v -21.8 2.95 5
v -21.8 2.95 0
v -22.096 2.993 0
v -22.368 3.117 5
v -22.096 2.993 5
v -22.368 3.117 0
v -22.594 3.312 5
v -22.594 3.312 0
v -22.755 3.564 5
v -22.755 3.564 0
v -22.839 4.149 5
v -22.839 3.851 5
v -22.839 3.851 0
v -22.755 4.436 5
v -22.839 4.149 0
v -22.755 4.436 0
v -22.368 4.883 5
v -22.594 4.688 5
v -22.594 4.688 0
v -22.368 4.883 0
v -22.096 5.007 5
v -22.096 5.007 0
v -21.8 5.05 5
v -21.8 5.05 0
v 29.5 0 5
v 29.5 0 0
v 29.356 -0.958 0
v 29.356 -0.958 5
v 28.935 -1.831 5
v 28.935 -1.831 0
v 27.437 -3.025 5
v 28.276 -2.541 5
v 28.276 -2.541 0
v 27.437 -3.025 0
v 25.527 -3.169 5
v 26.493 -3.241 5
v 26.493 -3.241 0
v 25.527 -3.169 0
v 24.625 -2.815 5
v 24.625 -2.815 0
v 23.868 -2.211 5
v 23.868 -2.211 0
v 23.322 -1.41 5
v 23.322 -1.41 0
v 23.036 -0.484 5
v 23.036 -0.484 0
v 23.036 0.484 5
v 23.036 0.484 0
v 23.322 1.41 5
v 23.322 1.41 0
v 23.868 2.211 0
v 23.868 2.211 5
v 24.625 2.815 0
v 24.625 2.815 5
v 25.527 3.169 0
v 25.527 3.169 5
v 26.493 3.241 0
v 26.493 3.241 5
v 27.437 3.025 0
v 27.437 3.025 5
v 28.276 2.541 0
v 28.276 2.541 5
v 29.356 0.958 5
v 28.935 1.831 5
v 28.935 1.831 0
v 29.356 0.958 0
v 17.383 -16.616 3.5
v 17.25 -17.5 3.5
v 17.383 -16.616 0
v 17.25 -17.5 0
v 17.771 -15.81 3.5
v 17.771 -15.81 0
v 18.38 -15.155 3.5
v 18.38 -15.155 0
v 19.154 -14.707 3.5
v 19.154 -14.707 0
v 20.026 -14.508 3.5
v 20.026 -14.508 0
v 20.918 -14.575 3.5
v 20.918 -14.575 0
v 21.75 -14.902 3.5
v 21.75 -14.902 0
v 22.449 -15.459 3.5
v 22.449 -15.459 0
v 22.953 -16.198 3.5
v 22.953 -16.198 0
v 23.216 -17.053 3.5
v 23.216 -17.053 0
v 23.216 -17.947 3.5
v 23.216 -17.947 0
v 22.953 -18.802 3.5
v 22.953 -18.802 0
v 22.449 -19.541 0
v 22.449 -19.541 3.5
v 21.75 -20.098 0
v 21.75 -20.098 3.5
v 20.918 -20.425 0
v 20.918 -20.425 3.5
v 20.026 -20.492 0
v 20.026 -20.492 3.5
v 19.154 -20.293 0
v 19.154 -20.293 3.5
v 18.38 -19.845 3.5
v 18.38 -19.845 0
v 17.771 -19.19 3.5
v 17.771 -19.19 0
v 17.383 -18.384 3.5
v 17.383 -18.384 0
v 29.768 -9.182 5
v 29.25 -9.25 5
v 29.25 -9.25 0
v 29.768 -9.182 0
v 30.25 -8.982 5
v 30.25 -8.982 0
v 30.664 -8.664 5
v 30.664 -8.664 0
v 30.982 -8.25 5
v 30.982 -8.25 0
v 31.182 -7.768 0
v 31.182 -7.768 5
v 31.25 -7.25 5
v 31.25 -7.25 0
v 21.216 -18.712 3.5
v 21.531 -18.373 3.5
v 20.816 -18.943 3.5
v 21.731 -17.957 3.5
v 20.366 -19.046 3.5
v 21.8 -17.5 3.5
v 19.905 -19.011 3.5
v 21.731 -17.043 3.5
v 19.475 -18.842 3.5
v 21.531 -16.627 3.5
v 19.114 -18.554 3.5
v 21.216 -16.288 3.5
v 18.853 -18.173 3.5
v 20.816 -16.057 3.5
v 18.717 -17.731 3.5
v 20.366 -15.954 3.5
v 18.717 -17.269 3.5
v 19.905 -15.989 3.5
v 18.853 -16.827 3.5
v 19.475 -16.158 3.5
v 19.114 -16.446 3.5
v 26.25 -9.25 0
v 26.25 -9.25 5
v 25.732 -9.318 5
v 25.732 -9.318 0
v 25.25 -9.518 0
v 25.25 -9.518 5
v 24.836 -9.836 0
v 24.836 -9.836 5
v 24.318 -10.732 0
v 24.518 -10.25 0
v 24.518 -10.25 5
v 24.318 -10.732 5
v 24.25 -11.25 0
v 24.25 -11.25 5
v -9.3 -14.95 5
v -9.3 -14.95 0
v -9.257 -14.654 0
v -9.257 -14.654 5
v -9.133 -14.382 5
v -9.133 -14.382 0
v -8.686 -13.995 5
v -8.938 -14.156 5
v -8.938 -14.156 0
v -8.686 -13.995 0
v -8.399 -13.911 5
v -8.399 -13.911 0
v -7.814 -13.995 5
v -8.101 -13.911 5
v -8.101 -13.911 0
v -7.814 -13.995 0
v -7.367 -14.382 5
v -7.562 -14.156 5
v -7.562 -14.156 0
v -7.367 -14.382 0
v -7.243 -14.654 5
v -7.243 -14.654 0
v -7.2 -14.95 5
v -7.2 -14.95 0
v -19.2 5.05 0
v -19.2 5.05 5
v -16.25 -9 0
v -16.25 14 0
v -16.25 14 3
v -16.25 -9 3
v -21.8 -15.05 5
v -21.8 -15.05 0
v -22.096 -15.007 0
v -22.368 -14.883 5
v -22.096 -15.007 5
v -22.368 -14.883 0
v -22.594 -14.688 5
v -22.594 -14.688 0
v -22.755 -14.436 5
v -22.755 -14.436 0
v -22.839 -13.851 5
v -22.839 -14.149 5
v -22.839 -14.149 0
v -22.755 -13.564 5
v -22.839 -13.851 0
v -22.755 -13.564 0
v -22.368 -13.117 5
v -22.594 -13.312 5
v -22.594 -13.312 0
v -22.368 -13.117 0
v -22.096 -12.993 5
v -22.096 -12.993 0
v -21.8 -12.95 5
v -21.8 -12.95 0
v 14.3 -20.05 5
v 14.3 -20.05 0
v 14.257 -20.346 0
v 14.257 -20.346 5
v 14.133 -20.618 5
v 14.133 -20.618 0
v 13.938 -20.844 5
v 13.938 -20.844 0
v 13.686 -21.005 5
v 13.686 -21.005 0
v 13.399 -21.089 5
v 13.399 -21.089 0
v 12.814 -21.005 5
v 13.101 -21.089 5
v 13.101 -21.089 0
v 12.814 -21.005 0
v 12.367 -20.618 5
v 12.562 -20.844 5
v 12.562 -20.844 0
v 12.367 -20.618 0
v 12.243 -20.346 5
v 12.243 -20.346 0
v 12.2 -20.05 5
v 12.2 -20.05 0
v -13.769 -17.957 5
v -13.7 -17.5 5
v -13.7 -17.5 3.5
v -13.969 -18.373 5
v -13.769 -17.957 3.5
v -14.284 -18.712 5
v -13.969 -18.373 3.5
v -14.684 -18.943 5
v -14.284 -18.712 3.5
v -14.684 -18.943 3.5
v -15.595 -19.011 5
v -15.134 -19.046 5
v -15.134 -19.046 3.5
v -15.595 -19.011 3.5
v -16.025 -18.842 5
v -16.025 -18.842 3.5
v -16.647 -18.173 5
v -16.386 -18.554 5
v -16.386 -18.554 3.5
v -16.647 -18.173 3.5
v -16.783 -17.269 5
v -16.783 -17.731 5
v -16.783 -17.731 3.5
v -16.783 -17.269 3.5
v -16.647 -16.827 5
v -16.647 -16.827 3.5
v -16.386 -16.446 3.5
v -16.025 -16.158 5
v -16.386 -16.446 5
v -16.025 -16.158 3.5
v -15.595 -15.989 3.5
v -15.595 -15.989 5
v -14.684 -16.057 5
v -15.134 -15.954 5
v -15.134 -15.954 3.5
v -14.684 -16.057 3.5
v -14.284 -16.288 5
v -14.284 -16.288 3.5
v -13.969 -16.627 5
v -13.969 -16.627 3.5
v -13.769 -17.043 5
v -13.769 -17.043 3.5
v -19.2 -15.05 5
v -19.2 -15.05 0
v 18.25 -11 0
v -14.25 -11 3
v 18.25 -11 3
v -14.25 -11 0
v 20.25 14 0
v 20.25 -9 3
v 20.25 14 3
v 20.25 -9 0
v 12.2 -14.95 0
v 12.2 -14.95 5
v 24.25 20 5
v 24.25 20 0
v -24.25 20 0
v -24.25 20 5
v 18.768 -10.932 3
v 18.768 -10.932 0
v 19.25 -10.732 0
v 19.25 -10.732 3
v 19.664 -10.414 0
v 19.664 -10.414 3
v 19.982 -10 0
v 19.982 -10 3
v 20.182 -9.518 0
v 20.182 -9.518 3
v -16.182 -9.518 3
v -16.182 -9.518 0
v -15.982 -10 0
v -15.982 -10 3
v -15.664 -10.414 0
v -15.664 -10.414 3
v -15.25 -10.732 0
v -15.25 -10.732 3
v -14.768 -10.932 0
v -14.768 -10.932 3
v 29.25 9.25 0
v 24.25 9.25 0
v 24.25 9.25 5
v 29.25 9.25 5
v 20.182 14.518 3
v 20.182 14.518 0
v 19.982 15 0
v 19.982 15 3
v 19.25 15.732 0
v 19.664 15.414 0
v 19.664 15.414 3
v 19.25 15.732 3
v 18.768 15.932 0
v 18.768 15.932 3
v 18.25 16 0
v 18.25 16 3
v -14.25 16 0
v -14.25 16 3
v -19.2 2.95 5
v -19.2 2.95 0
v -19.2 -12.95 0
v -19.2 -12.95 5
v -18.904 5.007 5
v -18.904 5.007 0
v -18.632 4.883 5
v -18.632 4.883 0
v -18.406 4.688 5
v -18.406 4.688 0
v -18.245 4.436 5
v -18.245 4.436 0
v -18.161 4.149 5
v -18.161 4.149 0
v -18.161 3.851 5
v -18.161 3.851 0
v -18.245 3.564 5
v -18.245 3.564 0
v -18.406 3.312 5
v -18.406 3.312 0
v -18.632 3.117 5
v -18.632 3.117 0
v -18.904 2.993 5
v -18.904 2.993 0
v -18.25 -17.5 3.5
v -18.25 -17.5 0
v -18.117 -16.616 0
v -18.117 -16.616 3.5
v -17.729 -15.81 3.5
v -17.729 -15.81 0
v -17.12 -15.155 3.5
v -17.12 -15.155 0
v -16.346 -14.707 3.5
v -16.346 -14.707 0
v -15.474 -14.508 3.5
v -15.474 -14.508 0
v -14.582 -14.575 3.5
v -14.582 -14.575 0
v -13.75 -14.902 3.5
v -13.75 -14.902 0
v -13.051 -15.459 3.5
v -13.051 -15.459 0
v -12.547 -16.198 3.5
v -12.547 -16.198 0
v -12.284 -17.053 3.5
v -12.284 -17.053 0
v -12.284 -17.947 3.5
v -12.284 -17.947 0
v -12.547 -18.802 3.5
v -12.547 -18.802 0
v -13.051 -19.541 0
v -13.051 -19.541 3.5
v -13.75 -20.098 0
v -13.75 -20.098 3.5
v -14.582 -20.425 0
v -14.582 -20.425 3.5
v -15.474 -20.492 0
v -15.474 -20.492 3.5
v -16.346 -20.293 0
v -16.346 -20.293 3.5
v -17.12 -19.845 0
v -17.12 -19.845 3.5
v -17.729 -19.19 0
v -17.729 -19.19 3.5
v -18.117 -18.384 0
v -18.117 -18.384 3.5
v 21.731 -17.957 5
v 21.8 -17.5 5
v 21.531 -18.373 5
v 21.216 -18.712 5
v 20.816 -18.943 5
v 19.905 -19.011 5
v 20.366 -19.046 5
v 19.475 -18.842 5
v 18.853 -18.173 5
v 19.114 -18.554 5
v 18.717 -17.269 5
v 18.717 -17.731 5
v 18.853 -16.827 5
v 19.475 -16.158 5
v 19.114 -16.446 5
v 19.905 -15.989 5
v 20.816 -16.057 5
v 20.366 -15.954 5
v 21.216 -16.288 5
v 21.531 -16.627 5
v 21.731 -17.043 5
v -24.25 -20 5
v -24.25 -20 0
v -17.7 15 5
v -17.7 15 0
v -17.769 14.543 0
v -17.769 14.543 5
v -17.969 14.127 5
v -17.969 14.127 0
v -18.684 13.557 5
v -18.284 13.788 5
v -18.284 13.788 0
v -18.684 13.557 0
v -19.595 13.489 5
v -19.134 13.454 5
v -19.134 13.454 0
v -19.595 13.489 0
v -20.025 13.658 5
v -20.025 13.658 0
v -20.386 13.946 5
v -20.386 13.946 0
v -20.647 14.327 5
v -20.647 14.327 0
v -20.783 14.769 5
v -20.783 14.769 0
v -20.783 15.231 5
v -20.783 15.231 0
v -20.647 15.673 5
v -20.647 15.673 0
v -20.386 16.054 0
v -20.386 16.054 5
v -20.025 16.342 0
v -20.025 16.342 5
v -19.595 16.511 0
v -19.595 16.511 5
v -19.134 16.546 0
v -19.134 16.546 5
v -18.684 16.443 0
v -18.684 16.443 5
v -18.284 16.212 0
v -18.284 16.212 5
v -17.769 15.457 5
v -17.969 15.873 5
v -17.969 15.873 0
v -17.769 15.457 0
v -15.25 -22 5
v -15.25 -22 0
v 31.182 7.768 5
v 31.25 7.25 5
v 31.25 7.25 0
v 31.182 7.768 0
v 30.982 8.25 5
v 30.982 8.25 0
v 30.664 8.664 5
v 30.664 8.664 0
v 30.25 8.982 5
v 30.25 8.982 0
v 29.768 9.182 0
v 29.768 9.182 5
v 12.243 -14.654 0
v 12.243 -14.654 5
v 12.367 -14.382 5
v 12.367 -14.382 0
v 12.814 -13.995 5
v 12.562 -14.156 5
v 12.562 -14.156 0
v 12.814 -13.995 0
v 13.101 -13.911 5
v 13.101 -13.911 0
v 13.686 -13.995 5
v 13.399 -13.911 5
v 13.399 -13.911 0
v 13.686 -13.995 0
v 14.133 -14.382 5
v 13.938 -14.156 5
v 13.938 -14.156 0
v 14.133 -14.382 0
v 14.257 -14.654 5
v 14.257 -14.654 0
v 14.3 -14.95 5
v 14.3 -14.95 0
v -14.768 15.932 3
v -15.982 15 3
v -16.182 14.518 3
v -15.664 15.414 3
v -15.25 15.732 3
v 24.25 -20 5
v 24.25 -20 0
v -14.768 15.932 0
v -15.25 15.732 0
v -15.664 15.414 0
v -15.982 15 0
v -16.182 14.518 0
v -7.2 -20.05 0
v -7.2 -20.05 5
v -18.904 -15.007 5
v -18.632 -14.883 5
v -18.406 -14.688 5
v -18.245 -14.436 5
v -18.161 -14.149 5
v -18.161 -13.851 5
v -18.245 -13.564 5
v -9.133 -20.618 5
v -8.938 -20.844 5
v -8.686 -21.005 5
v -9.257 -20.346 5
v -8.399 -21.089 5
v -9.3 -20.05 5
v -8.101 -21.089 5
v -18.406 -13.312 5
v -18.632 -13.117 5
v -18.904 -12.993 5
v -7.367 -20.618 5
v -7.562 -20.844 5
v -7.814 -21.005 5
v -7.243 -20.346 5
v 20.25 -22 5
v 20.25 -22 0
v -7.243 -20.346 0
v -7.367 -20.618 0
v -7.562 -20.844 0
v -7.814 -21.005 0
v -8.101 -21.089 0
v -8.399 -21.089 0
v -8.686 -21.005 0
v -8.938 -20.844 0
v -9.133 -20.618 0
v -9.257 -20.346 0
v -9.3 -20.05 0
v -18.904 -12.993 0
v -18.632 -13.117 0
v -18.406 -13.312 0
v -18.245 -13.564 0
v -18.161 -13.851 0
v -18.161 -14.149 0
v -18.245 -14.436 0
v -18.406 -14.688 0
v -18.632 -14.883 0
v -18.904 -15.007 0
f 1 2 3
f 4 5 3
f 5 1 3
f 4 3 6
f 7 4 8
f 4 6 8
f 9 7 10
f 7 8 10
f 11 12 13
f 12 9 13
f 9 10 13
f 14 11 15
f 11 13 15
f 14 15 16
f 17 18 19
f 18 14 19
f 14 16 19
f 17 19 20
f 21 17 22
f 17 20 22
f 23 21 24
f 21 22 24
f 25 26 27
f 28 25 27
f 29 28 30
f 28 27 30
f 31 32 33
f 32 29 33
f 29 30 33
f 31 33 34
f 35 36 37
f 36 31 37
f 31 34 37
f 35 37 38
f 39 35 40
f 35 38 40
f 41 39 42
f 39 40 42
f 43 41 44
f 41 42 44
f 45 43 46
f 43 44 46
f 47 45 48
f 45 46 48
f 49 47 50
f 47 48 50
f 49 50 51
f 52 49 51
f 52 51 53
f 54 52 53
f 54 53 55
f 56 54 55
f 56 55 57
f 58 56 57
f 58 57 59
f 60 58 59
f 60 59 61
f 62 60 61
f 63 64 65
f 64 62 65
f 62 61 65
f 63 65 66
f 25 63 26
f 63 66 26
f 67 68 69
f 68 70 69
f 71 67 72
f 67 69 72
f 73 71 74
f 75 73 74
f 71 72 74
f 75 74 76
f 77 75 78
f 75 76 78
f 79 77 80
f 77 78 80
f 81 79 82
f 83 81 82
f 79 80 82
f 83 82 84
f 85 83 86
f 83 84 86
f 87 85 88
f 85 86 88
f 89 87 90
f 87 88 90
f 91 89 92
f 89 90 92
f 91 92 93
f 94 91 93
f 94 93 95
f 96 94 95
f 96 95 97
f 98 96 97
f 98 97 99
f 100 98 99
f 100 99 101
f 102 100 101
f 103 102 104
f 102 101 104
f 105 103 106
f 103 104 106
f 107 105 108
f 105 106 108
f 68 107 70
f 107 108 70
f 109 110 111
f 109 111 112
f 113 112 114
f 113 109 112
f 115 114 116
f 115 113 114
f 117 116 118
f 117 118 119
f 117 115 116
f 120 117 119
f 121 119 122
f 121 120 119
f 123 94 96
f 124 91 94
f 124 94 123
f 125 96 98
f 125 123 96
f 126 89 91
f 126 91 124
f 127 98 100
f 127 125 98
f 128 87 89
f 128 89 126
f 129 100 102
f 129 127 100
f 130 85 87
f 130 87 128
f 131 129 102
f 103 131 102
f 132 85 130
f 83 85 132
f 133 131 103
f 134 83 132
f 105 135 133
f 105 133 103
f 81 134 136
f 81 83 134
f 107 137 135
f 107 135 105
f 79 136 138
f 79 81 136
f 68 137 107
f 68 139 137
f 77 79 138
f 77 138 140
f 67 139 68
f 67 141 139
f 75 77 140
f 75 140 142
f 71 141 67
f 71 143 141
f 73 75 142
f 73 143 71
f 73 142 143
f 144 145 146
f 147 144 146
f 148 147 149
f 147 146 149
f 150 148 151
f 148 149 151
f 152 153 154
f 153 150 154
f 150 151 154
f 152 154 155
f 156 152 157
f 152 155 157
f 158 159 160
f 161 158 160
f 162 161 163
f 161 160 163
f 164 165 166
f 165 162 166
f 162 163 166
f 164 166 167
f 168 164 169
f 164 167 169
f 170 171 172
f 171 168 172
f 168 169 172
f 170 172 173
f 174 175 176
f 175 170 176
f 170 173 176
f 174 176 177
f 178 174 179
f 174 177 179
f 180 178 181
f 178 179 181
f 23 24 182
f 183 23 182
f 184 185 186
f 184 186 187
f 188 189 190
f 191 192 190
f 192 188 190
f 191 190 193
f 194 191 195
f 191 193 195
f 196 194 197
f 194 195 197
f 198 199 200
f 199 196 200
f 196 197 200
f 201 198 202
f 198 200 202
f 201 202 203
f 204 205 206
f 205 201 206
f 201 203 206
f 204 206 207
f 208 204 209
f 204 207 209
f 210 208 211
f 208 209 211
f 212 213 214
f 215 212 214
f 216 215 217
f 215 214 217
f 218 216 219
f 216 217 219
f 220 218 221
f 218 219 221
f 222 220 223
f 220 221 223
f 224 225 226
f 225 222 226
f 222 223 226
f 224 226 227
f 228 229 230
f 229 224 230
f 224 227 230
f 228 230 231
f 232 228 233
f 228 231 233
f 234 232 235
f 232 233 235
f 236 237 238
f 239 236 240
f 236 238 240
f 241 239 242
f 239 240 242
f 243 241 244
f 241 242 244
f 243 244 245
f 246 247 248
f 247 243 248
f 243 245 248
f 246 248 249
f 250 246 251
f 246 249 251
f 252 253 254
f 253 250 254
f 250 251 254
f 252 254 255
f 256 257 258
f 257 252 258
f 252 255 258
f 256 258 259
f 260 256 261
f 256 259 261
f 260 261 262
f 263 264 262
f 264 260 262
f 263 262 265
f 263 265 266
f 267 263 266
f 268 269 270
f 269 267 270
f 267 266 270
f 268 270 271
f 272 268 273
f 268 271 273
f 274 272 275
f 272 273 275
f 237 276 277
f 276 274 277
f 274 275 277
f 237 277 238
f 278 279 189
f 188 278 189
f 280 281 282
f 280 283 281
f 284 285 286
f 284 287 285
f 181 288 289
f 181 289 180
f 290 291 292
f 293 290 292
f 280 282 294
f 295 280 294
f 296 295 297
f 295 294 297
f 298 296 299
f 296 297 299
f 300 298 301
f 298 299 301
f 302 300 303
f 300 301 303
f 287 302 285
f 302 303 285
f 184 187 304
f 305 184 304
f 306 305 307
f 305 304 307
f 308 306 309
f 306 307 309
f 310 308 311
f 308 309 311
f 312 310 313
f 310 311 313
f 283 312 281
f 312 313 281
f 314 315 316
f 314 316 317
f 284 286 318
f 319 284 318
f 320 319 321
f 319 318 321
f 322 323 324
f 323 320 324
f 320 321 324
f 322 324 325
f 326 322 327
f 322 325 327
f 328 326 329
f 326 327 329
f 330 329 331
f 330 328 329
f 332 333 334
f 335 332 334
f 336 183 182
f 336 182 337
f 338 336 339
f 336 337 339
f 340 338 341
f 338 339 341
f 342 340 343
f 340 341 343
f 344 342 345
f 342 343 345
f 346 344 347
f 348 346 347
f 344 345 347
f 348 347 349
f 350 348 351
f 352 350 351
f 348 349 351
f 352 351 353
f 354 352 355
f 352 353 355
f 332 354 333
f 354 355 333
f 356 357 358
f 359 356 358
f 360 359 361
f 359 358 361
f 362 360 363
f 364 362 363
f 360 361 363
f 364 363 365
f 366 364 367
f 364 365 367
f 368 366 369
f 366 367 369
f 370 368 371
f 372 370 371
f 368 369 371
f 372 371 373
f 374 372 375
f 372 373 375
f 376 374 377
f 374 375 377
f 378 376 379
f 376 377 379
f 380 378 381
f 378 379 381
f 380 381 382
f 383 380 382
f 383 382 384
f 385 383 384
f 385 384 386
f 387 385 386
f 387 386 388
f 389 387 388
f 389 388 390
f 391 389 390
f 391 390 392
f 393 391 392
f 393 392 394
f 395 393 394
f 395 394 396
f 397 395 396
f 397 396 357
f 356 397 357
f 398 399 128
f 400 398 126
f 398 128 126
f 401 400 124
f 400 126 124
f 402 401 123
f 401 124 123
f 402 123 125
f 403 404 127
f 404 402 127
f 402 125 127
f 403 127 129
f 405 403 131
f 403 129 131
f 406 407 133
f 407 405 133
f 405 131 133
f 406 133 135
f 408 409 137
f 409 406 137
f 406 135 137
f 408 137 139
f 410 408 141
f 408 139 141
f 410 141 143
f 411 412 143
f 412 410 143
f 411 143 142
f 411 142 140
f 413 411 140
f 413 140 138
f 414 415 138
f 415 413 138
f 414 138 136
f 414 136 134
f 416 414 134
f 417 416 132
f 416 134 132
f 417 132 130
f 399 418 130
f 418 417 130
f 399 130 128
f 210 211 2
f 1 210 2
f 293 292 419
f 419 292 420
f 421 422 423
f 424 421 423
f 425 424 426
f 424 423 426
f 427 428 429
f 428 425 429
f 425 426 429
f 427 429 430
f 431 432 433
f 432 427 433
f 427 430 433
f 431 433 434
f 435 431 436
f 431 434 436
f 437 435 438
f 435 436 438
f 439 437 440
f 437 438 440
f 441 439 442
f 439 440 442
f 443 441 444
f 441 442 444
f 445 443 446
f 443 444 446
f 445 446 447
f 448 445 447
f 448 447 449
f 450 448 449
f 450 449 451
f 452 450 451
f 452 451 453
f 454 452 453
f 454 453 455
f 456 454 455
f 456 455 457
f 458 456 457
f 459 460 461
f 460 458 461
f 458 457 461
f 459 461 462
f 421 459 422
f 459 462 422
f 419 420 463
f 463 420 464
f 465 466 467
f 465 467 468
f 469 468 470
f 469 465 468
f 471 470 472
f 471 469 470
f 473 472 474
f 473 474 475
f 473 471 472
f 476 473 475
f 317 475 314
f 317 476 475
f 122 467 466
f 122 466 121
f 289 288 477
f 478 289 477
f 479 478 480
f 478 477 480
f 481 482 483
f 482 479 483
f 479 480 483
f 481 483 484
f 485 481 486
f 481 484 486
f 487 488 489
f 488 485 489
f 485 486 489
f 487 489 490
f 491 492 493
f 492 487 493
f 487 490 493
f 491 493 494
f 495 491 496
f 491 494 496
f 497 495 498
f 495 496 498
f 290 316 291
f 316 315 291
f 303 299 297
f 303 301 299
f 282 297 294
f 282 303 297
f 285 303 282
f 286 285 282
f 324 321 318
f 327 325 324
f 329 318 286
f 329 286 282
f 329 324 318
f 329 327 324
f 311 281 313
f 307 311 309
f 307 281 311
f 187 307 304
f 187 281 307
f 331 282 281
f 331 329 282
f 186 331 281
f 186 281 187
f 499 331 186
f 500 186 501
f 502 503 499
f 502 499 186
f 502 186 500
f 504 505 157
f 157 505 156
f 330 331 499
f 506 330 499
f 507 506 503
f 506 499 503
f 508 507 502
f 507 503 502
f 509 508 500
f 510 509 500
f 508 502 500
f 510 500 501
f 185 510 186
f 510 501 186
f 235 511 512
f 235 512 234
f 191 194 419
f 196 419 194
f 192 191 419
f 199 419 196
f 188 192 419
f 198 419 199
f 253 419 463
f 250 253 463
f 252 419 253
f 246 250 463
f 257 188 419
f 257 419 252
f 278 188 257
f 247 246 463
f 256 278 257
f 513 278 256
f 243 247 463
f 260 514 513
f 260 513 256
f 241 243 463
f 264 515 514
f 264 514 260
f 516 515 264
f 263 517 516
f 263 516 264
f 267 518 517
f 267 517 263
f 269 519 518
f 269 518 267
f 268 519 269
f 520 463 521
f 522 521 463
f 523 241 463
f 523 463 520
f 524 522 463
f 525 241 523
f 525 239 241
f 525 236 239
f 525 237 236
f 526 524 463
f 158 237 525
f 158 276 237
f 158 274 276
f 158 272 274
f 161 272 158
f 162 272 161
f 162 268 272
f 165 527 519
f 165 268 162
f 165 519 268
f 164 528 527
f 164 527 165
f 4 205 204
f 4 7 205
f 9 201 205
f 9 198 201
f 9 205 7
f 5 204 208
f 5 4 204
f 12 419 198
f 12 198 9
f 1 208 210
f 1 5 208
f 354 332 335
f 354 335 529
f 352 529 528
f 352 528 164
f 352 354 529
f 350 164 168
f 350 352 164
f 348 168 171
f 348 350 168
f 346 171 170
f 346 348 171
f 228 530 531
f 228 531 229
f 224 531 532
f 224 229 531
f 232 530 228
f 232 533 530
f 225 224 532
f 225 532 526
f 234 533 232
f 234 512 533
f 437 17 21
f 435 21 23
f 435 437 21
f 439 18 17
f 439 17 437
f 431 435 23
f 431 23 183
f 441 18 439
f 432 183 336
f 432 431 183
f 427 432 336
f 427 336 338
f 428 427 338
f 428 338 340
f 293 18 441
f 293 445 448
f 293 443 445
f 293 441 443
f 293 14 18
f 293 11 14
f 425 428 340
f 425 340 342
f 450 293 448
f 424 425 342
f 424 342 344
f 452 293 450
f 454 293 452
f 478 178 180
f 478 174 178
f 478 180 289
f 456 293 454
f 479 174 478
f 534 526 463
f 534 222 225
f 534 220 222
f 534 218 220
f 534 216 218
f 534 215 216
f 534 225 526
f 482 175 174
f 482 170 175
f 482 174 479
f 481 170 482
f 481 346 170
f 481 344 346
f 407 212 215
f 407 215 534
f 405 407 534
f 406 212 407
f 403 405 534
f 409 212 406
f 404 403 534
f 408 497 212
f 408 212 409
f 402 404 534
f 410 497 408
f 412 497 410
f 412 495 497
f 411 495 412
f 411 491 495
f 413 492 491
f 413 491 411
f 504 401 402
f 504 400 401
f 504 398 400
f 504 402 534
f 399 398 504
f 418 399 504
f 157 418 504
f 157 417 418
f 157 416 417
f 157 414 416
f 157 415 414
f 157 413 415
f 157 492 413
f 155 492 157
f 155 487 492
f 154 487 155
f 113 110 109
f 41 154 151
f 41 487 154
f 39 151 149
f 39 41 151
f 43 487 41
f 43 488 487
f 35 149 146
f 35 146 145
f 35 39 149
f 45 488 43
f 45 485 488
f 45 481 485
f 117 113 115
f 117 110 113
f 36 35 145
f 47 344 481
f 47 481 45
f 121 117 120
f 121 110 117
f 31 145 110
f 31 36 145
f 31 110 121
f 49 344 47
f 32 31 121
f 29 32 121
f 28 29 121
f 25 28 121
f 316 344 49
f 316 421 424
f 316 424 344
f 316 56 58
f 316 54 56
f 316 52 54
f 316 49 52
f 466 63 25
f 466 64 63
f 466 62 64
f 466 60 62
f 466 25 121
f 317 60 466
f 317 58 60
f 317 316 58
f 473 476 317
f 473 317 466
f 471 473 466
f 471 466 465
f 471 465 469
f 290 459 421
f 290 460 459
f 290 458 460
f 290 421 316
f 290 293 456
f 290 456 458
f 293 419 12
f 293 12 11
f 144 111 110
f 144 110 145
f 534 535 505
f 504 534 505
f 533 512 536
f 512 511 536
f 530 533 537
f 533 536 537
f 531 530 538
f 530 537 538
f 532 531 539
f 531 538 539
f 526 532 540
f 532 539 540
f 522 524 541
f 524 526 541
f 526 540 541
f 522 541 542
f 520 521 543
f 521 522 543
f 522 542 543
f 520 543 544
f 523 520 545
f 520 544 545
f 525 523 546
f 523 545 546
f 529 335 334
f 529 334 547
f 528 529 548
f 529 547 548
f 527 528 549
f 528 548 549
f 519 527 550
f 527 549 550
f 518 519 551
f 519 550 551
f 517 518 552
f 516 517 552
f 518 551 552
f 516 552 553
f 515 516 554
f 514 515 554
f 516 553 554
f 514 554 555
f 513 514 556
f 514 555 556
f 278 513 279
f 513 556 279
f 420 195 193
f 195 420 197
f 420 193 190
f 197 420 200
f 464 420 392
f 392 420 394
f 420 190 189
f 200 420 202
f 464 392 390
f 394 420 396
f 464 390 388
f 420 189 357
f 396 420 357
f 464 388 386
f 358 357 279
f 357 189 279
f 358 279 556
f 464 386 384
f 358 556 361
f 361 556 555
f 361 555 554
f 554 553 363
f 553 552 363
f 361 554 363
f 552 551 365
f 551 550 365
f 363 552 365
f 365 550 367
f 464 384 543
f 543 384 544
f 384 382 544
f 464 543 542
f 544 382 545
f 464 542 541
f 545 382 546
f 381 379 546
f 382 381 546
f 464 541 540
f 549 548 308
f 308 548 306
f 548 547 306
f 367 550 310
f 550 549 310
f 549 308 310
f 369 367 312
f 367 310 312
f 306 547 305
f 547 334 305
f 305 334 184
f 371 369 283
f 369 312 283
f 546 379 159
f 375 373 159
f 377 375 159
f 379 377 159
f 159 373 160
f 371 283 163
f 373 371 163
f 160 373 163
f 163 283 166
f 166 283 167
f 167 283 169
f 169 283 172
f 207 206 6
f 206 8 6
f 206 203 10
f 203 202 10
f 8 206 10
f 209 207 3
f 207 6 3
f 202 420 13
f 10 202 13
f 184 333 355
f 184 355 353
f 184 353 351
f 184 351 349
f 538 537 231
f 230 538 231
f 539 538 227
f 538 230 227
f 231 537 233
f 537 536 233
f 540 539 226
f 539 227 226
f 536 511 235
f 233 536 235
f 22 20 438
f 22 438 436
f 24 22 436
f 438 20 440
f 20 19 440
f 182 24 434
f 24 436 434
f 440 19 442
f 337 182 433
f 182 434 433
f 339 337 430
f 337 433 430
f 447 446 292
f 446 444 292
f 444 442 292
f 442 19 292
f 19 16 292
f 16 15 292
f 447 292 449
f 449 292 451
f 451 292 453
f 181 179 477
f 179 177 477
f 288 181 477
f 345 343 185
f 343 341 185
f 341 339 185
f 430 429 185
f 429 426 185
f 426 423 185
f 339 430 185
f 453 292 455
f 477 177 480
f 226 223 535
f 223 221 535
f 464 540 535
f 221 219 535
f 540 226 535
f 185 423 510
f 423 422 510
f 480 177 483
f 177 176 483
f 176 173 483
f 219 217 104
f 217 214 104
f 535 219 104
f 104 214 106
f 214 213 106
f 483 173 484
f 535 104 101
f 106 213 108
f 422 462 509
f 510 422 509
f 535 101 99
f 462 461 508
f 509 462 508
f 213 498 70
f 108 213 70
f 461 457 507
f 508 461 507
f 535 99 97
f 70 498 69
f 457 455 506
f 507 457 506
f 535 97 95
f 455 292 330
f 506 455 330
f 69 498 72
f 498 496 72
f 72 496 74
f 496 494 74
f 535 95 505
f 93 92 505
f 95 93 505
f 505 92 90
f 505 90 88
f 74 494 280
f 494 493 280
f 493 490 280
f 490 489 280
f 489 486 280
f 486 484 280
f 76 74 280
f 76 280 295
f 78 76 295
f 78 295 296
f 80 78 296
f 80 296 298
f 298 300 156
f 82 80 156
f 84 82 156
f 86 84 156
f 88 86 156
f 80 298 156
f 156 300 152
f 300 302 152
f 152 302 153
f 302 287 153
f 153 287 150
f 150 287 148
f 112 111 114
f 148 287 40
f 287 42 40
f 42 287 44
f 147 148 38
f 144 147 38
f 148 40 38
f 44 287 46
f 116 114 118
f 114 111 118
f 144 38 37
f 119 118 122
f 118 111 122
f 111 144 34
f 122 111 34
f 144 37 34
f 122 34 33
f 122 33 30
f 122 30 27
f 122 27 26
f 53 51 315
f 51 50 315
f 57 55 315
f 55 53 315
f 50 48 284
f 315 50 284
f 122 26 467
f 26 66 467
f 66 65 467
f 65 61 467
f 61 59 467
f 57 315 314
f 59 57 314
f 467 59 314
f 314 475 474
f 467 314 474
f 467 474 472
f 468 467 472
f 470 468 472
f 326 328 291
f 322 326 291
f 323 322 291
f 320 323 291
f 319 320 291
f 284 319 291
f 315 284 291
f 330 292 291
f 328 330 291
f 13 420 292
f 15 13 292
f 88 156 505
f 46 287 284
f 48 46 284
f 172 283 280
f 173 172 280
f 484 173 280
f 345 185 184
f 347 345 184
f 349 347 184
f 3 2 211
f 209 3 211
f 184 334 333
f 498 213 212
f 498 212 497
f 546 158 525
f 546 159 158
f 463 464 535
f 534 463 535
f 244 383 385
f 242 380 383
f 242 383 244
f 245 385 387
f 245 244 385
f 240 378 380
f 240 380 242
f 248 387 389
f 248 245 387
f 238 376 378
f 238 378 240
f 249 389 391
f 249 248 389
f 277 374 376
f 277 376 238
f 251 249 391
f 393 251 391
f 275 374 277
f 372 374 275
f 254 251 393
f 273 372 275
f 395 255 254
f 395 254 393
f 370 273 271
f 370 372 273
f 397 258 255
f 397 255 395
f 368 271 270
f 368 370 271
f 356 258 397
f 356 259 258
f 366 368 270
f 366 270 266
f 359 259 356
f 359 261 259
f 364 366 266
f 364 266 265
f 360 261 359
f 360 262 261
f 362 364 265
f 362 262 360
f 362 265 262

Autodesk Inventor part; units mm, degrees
ref_plane "YZ Plane" through (0, 0, 0) normal (1, 0, 0) x (0, 1, 0)
ref_plane "XZ Plane" through (0, 0, 0) normal (0, 1, 0) x (-1, 0, 0)
ref_plane "XY Plane" through (0, 0, 0) normal (0, 0, 1) x (1, 0, 0)
sketch "スケッチ1" plane through (0, 0, 0) normal (0, 0, 1) x (1, 0, 0)
  line L0 (-24.25, -20) -> (24.25, -20) construction
  line L1 (24.25, 20) -> (-24.25, 20)
  line L2 (-24.25, 20) -> (-24.25, -20)
  line L3 (-24.25, -20) -> (24.25, 20) construction
  line L4 (24.25, -20) -> (-24.25, 20) construction
  circle A0 centre (-15.25, -17.5) radius 1.55
  circle A1 centre (20.25, -17.5) radius 1.55
  line L5 (-9.25, -15) -> (14.25, -15) construction
  line L6 (14.25, -15) -> (14.25, -20) construction
  line L7 (14.25, -20) -> (-9.25, -20) construction
  line L8 (-9.25, -20) -> (-9.25, -15) construction
  line L9 (-24.25, -20) -> (-15.25, -22)
  line L10 (-15.25, -22) -> (20.25, -22)
  line L11 (20.25, -22) -> (24.25, -20)
  line L12 (14.3, -14.95) -> (-9.3, -14.95)
  line L13 (-9.3, -14.95) -> (-9.3, -20.05)
  line L14 (-9.3, -20.05) -> (14.3, -20.05)
  line L15 (14.3, -20.05) -> (14.3, -14.95)
  circle A2 centre (-8.25, -14.95) radius 1.05
  circle A3 centre (-8.25, -20.05) radius 1.05
  circle A4 centre (13.25, -14.95) radius 1.05
  circle A5 centre (13.25, -20.05) radius 1.05
  circle A6 centre (-19.25, 15) radius 1.55
  line L16 (-21.8, 5.05) -> (-19.2, 5.05)
  line L17 (-19.2, 5.05) -> (-19.2, -15.05)
  line L18 (-19.2, -15.05) -> (-21.8, -15.05)
  line L19 (-21.8, -15.05) -> (-21.8, 5.05)
  line L20 (-19.25, 5) -> (-21.75, 5) construction
  line L21 (-21.75, 5) -> (-21.75, -15) construction
  line L22 (-21.75, -15) -> (-19.25, -15) construction
  line L23 (-19.25, -15) -> (-19.25, 5) construction
  line L24 (2.5, -14.95) -> (2.5, -20.05) construction
  circle A7 centre (-21.8, 4) radius 1.05
  circle A8 centre (-19.2, 4) radius 1.05
  circle A9 centre (-21.8, -14) radius 1.05
  circle A10 centre (-19.2, -14) radius 1.05
  line L25 (24.25, 9.25) -> (31.25, 9.25)
  line L26 (31.25, 9.25) -> (31.25, -9.25)
  line L27 (31.25, -9.25) -> (24.25, -9.25)
  circle A11 centre (26.25, 0) radius 3.25
  line L28 (24.25, -20) -> (24.25, -9.25)
  line L29 (24.25, 9.25) -> (24.25, 20)
  point P0 (0, 0)
  point P1 (-9.25, -17.5)
  point P2 (12.2, -20.05)
  point P3 (-7.2, -20.05)
  point P4 (-7.2, -14.95)
  point P5 (12.2, -14.95)
  point P6 (-21.8, -12.95)
  point P7 (-21.8, 2.95)
  point P8 (-19.2, 2.95)
  point P9 (-19.2, -12.95)
  dimension "d10" = 2.1
  dimension "d26" = 2.1
  dimension "d0" = 5
  dimension "d3" = 3.1
  dimension "d4" = 35.5
  dimension "d5" = 2
  dimension "d7" = 40
  dimension "d8" = 23.5
  dimension "d9" = 0.05
  dimension "d11" = 3.1
  dimension "d12" = 5
  dimension "d13" = 5
  dimension "d14" = 0.05
  dimension "d15" = 17.75
  dimension "d16" = 48.5
  dimension "d20" = 2.5
  dimension "d21" = 2.5
  dimension "d22" = 5
  dimension "d23" = 15
  dimension "d27" = 25
  dimension "d58" = 6.5
  dimension "d60" = 9.25
  dimension "d61" = 18.5
  dimension "d62" = 20
  dimension "d65" = 2
  dimension "d66" = 5
extrude "押し出し1" add sketch "スケッチ1" along normal blind 5
sketch "スケッチ2" plane through (0, 0, 0) normal (0, 0, -1) x (-1, 0, 0)
  line L0 (-14.3, -20.05) -> (-14.3, -14.95) projected
  line L1 (-12.2, -14.95) -> (7.2, -14.95) projected
  line L2 (-24.25, 20) -> (24.25, 20) projected
  line L3 (-24.25, -20) -> (-24.25, 20) projected
  line L4 (21.8, -15.05) -> (19.2, -15.05) projected
  line L5 (19.2, -12.95) -> (19.2, 2.95) projected
  line L6 (19.2, 5.05) -> (21.8, 5.05) projected
  line L7 (-20.25, 16) -> (16.25, 16)
  line L8 (16.25, 16) -> (16.25, -11)
  line L9 (16.25, -11) -> (-20.25, -11)
  line L10 (-20.25, -11) -> (-20.25, -5.9161)
  line L11 (-20.25, 16) -> (-20.25, 5.9161)
  line L12 (19.25, 5.05) -> (19.25, -15.05) construction
  line L13 (19.2, -15.05) -> (21.8, -15.05) projected
  line L14 (-14.3, -15) -> (9.3, -15) construction
  line L15 (9.3, -20.05) -> (9.3, -14.95) projected
  line L16 (-20.25, 5.9161) -> (-20.25, -5.9161)
  point P0 (0, 0)
  dimension "d29" = 4
  dimension "d30" = 4
  dimension "d31" = 0.05
  dimension "d32" = 3
  dimension "d33" = 0.05
  dimension "d34" = 4
sketch "スケッチ3" plane through (0, 0, 0) normal (0, 0, -1) x (-1, 0, 0)
  circle A0 centre (15.25, -17.5) radius 1.55 projected
  circle A1 centre (15.25, -17.5) radius 3
  circle A2 centre (19.25, 15) radius 1.55 projected
  circle A3 centre (19.25, 15) radius 3
  circle A4 centre (-20.25, -17.5) radius 3
  point P0 (0, 0)
  dimension "d38" = 6
  dimension "d39" = 6
  dimension "d40" = 6
extrude "押し出し3" cut sketch "スケッチ3" against normal blind 3.5 contours A1 | A4
extrude "押し出し5" cut sketch "スケッチ2" against normal blind 3
fillet "フィレット4" radius 2 4 edges at (20.25, -11, 1.5) (20.25, 16, 1.5) (-16.25, 16, 1.5) (-16.25, -11, 1.5)
fillet "フィレット5" radius 2 3 edges at (24.25, -9.25, 2.5) (31.25, -9.25, 2.5) (31.25, 9.25, 2.5)
equation "\"d13\" = d12"
equation "\"d15\" = 0.5 * d4"
equation "\"d60\" = 0.5 * d61"
properties part number "コックピット_サブフレーム_1_5_New" material "アセタール樹脂、黒"
